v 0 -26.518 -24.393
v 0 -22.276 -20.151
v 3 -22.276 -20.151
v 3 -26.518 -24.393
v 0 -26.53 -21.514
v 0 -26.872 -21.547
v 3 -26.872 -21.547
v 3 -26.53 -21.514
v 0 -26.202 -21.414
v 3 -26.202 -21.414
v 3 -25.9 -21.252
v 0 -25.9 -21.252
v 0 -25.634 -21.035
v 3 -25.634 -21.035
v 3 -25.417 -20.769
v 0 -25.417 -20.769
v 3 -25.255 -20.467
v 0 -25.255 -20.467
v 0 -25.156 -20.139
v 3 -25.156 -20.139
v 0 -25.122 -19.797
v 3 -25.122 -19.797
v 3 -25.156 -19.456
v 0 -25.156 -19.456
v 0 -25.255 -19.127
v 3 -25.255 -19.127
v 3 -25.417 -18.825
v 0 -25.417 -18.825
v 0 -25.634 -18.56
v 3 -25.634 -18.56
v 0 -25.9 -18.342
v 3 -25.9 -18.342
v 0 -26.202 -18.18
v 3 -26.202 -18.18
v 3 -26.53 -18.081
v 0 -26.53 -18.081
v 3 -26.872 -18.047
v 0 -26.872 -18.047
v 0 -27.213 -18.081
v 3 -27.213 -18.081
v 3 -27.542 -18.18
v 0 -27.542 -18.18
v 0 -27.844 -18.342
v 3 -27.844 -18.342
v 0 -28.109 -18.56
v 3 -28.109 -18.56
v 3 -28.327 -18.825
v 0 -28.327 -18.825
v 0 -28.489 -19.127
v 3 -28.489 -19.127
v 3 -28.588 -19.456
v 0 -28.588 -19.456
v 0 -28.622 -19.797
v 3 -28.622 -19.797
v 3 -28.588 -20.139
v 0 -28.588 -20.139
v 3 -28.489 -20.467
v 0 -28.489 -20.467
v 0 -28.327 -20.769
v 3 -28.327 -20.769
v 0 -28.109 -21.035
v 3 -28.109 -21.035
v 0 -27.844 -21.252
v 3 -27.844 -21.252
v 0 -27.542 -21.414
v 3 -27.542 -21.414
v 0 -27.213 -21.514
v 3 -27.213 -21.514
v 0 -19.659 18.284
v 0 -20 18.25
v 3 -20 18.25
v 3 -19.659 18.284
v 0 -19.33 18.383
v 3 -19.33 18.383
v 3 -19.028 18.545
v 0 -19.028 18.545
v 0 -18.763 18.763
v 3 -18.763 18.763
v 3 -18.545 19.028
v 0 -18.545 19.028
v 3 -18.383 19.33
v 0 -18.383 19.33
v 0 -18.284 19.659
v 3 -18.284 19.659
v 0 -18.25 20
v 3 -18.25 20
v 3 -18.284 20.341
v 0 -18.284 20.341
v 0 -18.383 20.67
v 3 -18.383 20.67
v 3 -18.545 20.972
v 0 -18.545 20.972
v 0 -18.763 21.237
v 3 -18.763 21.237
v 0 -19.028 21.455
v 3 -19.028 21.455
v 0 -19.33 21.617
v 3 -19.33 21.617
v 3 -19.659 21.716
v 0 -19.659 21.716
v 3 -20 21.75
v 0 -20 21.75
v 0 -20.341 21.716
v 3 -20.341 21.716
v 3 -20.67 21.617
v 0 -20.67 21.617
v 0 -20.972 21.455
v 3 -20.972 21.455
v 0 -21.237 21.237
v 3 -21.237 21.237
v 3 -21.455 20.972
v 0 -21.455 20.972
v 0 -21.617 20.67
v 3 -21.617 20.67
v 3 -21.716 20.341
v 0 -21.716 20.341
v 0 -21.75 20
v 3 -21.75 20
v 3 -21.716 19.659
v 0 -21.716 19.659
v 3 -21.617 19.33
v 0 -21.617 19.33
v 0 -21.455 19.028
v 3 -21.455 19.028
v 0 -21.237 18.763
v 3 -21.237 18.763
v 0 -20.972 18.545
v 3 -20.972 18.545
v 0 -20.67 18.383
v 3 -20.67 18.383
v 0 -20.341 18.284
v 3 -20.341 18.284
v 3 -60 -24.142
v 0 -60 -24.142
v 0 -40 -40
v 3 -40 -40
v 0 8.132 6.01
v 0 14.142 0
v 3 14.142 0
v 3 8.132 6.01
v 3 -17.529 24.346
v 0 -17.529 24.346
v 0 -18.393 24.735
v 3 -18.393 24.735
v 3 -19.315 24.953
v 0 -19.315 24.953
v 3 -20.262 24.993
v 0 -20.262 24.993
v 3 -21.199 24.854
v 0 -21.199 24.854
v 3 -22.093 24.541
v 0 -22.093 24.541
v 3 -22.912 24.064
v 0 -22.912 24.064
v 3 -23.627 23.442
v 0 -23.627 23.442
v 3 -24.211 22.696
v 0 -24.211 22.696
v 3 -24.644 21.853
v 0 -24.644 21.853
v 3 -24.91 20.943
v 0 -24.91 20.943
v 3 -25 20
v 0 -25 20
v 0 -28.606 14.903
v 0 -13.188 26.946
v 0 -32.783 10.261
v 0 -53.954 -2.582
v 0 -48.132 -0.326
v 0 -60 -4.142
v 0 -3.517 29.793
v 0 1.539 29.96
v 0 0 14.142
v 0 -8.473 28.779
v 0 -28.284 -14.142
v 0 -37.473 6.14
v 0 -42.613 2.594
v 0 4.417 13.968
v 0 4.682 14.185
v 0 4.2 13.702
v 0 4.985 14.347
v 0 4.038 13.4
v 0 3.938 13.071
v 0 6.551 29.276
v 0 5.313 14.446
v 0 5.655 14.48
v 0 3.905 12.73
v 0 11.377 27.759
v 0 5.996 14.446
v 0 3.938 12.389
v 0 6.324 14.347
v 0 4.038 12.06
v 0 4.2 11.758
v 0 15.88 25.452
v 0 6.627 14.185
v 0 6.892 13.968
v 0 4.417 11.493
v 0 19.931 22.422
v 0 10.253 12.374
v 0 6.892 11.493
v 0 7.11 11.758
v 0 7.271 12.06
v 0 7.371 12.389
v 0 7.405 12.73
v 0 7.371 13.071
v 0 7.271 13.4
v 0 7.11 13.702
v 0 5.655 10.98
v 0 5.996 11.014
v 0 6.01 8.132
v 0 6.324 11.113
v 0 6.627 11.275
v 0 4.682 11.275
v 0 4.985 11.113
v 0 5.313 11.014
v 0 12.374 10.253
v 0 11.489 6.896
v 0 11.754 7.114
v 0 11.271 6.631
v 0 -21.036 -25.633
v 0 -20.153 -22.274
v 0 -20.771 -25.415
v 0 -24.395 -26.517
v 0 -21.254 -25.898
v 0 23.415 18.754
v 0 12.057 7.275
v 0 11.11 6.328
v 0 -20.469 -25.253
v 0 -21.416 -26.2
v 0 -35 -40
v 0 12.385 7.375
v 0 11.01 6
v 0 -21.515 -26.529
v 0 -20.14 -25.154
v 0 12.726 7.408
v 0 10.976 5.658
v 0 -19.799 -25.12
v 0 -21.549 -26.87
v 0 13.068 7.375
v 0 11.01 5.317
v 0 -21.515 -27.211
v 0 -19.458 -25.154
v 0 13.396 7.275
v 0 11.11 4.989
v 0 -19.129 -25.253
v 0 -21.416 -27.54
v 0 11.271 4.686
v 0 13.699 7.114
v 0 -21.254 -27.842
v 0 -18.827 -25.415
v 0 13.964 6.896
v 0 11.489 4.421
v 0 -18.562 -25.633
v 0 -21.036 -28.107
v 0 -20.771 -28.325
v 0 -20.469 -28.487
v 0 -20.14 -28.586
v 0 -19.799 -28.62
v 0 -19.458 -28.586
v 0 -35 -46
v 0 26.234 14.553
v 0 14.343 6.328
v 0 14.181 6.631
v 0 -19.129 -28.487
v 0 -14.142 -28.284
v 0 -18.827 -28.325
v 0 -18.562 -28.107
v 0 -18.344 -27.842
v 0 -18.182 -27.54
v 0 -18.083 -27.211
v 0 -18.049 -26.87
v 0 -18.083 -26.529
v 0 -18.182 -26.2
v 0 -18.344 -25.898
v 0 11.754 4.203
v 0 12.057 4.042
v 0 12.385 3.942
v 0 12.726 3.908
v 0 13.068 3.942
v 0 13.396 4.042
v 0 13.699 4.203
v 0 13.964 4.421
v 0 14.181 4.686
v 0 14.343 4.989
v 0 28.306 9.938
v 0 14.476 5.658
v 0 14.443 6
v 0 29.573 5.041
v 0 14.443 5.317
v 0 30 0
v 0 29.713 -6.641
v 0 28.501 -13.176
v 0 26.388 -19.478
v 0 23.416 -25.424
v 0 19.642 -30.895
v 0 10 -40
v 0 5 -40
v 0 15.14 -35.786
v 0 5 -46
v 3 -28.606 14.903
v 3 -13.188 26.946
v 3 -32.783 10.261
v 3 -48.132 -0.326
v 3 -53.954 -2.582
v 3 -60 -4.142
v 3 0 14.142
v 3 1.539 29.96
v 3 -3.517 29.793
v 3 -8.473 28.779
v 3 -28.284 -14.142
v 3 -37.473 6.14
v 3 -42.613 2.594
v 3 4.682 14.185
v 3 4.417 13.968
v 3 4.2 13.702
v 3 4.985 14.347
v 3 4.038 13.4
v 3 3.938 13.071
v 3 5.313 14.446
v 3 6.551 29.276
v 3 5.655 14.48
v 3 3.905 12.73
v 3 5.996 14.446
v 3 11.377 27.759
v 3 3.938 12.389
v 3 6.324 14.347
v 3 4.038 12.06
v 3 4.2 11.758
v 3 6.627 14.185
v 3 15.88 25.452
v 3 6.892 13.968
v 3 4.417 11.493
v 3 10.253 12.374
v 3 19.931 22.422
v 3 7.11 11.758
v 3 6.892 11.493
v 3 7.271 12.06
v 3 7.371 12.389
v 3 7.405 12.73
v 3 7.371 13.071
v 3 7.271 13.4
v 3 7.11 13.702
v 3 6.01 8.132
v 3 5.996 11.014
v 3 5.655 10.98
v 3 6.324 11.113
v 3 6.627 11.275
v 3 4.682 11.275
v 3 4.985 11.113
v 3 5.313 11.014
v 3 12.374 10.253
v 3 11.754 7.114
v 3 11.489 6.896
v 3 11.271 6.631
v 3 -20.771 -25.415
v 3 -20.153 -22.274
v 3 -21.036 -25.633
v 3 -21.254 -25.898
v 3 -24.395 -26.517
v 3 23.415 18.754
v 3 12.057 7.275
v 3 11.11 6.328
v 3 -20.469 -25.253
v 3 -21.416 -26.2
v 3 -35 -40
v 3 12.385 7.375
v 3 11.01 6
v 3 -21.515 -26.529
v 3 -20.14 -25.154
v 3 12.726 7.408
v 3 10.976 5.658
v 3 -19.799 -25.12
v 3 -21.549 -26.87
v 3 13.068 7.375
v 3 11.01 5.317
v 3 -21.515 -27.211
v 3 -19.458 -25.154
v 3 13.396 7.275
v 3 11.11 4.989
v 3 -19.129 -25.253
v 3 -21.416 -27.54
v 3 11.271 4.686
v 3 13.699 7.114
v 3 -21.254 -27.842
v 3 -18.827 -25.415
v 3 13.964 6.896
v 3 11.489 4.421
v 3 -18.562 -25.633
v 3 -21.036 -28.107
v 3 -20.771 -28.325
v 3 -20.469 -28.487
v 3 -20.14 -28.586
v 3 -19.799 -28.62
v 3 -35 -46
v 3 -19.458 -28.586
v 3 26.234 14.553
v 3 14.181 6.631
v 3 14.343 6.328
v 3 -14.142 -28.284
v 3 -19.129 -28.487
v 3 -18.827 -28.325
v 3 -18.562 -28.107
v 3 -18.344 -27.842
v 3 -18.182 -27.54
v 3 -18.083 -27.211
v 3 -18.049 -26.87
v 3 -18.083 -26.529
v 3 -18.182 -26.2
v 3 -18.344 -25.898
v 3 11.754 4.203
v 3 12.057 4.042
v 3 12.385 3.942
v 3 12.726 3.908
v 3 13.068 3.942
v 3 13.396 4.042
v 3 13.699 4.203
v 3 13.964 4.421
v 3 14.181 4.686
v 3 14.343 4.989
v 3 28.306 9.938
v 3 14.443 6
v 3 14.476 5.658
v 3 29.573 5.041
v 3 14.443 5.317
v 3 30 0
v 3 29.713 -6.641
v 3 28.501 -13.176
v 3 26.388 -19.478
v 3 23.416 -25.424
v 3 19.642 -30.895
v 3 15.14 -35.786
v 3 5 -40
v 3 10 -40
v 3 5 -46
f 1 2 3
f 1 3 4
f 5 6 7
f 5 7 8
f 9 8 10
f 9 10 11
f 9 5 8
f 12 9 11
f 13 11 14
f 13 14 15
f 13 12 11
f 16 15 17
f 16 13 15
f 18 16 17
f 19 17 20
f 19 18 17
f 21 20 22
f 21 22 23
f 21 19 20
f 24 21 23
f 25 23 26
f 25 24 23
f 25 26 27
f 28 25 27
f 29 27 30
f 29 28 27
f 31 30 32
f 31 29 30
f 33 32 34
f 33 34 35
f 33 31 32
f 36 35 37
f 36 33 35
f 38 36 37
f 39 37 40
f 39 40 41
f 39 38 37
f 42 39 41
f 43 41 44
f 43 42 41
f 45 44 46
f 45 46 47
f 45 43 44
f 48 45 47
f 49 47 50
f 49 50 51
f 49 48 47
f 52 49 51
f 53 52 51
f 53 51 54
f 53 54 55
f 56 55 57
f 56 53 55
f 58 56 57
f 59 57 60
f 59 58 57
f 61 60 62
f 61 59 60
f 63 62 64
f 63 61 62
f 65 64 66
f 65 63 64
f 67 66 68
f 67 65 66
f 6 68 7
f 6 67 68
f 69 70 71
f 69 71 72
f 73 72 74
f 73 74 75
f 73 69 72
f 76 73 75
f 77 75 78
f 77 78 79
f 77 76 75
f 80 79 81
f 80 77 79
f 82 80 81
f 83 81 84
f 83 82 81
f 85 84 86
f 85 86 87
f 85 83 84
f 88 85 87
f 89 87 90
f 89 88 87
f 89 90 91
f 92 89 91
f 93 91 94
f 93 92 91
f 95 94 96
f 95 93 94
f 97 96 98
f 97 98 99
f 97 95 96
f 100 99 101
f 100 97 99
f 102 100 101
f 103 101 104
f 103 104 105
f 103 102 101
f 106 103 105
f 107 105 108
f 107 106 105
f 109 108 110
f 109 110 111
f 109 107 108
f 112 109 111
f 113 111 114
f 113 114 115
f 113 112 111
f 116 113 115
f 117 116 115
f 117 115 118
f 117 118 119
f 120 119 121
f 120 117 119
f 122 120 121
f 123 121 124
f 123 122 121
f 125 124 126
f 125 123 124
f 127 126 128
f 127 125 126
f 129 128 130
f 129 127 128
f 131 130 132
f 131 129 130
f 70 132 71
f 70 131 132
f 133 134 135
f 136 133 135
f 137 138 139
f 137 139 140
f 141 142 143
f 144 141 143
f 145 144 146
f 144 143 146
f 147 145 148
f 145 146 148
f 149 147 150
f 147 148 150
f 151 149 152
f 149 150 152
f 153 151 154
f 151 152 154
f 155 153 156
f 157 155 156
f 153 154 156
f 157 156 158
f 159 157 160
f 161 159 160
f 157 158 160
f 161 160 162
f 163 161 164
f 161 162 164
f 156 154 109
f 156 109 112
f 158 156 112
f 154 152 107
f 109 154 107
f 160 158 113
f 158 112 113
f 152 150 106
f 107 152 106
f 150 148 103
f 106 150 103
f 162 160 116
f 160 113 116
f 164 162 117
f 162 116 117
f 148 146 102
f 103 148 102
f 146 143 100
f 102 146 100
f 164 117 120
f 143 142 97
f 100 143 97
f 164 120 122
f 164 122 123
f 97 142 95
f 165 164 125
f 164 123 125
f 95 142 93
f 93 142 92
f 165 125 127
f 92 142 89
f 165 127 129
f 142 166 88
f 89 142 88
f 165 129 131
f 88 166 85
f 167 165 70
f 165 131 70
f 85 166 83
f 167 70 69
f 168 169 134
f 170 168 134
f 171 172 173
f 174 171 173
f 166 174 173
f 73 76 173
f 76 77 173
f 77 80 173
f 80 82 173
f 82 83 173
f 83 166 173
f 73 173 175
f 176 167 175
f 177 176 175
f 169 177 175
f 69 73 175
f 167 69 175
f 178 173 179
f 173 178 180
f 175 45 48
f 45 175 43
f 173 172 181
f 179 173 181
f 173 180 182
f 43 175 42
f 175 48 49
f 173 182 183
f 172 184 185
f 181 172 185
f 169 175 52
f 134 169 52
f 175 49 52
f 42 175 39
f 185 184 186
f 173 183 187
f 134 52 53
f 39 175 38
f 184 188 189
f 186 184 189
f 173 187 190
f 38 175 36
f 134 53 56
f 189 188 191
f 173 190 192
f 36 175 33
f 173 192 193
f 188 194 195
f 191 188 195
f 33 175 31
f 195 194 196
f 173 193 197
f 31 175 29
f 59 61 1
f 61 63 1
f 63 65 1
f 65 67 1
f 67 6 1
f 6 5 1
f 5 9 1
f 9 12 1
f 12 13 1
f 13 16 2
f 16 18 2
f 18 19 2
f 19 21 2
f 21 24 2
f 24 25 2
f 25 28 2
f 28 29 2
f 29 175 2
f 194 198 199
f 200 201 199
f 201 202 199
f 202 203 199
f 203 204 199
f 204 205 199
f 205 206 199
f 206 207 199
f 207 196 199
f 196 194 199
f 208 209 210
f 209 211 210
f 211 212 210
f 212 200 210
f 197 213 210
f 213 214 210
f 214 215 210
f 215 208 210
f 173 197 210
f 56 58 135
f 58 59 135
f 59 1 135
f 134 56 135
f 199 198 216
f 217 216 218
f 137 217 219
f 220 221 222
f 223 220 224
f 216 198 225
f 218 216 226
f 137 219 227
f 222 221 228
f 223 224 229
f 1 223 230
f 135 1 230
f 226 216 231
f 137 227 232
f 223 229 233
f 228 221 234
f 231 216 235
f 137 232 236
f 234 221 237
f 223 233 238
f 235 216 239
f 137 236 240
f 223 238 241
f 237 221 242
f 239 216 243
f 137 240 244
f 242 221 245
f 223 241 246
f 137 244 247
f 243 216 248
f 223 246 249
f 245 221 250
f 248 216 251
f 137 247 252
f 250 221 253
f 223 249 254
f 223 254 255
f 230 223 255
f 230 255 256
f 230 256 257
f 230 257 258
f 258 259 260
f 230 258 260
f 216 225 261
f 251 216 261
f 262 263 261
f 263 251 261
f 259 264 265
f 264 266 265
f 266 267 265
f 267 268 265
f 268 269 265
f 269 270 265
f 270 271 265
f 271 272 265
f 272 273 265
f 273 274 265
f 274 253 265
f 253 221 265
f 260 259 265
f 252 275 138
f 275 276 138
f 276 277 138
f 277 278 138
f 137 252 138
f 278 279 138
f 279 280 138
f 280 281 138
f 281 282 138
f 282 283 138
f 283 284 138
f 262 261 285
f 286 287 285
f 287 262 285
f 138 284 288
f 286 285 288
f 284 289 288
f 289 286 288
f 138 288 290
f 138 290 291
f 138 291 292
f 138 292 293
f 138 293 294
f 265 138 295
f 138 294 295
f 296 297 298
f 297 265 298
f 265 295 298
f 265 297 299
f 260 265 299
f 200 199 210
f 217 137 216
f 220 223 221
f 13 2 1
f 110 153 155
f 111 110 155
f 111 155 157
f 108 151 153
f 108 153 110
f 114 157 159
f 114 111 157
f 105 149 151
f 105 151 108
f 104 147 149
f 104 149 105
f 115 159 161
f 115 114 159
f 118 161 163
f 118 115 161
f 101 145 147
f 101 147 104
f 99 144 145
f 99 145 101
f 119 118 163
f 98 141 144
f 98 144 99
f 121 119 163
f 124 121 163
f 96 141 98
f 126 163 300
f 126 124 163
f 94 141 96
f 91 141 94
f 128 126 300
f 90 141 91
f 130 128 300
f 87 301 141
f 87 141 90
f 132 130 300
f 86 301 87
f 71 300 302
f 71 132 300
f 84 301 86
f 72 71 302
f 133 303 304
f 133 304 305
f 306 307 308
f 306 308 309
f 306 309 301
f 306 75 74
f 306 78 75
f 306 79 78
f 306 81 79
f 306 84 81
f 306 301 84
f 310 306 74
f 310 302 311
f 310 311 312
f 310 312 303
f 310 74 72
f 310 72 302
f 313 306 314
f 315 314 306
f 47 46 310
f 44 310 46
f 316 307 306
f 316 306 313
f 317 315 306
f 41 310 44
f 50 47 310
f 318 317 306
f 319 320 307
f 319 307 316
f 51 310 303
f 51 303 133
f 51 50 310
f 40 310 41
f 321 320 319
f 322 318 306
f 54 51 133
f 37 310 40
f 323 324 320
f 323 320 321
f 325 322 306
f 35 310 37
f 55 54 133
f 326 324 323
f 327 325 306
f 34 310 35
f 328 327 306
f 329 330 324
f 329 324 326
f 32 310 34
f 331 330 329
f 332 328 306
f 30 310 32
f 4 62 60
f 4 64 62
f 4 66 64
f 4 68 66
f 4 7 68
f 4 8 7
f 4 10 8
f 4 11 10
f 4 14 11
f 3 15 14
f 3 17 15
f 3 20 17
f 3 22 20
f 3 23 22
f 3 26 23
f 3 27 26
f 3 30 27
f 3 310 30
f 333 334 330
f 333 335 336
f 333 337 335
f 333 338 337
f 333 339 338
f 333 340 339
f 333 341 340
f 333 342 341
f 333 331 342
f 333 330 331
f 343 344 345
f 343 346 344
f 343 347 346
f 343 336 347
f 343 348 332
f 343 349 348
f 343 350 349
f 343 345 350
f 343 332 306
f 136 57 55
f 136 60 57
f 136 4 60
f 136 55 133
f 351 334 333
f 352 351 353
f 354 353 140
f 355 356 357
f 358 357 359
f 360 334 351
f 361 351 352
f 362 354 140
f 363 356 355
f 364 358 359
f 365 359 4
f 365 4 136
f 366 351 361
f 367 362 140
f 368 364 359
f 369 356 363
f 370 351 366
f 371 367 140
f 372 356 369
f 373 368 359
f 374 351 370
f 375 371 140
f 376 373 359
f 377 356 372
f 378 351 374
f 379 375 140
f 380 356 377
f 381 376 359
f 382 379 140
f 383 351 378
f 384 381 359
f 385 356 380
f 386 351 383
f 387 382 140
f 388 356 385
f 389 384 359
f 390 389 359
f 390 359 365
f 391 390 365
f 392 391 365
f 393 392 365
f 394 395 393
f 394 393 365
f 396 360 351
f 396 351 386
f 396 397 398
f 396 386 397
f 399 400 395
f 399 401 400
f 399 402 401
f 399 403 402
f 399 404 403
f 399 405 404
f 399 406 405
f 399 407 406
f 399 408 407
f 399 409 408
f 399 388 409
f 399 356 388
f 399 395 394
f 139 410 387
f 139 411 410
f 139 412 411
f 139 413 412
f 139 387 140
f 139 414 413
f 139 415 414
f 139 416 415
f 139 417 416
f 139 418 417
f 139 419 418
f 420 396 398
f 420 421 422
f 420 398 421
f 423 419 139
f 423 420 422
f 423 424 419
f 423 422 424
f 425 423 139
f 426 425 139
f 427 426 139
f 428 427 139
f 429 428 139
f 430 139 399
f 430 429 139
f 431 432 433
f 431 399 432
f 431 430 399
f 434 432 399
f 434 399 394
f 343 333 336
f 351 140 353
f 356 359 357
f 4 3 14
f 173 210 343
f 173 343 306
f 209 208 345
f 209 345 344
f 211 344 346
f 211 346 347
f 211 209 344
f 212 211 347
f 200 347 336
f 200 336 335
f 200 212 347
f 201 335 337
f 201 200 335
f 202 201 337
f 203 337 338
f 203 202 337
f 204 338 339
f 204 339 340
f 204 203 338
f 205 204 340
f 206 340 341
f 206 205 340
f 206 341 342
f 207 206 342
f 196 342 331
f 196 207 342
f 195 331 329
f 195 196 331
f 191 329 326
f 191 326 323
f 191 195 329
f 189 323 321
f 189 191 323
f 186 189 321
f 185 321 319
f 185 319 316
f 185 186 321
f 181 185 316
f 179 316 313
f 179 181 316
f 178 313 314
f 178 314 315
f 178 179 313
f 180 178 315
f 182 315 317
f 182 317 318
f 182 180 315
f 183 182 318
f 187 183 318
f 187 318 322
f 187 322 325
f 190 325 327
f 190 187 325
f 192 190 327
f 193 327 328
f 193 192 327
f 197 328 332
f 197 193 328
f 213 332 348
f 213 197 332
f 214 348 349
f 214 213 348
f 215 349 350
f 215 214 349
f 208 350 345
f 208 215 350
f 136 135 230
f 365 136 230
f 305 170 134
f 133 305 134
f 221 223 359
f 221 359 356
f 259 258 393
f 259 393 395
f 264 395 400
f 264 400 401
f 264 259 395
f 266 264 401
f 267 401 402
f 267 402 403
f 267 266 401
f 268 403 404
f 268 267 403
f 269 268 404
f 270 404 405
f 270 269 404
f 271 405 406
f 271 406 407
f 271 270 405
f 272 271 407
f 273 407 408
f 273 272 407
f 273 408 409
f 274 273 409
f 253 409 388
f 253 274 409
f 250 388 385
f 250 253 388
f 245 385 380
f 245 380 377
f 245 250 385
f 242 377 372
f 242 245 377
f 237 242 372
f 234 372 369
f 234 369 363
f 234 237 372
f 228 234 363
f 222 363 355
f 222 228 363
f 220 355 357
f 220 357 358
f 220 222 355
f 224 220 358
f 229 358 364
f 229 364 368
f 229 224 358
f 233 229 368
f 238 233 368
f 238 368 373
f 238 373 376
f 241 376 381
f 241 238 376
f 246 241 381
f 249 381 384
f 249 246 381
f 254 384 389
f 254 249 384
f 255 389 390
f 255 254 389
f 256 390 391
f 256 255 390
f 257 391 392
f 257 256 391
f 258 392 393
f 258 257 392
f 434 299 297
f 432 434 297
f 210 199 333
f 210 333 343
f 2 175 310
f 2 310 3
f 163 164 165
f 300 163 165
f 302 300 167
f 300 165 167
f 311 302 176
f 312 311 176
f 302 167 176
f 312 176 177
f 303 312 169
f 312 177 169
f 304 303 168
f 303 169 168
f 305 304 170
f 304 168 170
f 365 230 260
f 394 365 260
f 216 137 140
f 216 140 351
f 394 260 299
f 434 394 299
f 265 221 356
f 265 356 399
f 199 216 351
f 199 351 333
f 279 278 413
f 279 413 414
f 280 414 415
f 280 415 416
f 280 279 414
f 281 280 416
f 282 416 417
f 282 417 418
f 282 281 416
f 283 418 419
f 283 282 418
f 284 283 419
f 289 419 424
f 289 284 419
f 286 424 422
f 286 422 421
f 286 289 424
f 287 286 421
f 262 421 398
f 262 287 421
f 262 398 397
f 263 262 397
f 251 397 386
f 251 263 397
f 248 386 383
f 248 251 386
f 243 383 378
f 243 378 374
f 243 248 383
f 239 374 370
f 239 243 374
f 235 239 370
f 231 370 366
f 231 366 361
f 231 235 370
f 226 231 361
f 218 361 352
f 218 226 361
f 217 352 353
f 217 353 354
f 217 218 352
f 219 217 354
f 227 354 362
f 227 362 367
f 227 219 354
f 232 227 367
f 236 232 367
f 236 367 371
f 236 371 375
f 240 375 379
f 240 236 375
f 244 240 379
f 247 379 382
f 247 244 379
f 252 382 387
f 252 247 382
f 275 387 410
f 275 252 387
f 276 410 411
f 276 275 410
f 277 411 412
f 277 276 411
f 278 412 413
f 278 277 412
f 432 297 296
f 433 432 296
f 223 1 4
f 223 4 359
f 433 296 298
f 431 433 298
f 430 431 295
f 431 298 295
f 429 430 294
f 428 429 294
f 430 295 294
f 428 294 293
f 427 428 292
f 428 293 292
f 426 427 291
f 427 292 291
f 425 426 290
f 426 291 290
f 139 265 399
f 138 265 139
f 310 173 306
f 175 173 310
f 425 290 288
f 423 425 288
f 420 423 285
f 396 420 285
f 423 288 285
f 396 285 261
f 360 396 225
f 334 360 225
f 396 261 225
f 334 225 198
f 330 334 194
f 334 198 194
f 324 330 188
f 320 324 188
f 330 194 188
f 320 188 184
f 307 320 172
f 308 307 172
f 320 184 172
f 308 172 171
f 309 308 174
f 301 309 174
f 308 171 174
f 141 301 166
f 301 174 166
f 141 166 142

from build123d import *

# Parameters (mm, degrees)
CROQUIS1_R              = 1.75
SALIENTE_EXTRUIR1_DEPTH = 3


with BuildPart() as part:
    # Croquis1 → Saliente-Extruir1 (new body)
    with BuildSketch(Plane(origin=(0, 0, 0), x_dir=(0, 0, -1), z_dir=(1, 0, 0))):
        with BuildLine():
            Line((4.142135624, -60), (24.142135624, -60))
            Line((24.142135624, -60), (40, -40))
            Line((40, -40), (40, -35))
            Line((40, -35), (46, -35))
            Line((46, -35), (46, 5))
            Line((46, 5), (40, 5))
            Line((40, 5), (40, 10))
            ThreePointArc((40, 10), (22.503199777, 25.006399554), (0, 30))
            ThreePointArc((0, 30), (-26.700709952, 13.677429877), (-24.346472536, -17.528527464))
            ThreePointArc((-24.346472536, -17.528527464), (-24.321884003, -22.514223272), (-20, -25))
            ThreePointArc((-20, -25), (-4.291896326, -39.991262484), (4.142135624, -60))
        make_face()
        with Locations((-12.730077402, 5.654698909)):
            Circle(CROQUIS1_R, mode=Mode.SUBTRACT)
        with Locations((-5.658477353, 12.726298958)):
            Circle(CROQUIS1_R, mode=Mode.SUBTRACT)
        with Locations((26.870057685, -19.798989873)):
            Circle(CROQUIS1_R, mode=Mode.SUBTRACT)
        with Locations((19.797157185, -26.871890373)):
            Circle(CROQUIS1_R, mode=Mode.SUBTRACT)
        with Locations((-20, -20)):
            Circle(CROQUIS1_R, mode=Mode.SUBTRACT)
        Polygon((-14.142135624, 0), (14.142135624, -28.284271247), (20.150710576, -22.275696296), (24.393351263, -26.518336983), (26.516504294, -24.395183951), (22.273863607, -20.152543264), (28.284271247, -14.142135624), (0, 14.142135624), (-6.01040764, 8.131727984), (-10.253048327, 12.374368671), (-12.374368671, 10.253048327), (-8.131727984, 6.01040764), align=None, mode=Mode.SUBTRACT)
    extrude(amount=SALIENTE_EXTRUIR1_DEPTH)


solid = part.part
